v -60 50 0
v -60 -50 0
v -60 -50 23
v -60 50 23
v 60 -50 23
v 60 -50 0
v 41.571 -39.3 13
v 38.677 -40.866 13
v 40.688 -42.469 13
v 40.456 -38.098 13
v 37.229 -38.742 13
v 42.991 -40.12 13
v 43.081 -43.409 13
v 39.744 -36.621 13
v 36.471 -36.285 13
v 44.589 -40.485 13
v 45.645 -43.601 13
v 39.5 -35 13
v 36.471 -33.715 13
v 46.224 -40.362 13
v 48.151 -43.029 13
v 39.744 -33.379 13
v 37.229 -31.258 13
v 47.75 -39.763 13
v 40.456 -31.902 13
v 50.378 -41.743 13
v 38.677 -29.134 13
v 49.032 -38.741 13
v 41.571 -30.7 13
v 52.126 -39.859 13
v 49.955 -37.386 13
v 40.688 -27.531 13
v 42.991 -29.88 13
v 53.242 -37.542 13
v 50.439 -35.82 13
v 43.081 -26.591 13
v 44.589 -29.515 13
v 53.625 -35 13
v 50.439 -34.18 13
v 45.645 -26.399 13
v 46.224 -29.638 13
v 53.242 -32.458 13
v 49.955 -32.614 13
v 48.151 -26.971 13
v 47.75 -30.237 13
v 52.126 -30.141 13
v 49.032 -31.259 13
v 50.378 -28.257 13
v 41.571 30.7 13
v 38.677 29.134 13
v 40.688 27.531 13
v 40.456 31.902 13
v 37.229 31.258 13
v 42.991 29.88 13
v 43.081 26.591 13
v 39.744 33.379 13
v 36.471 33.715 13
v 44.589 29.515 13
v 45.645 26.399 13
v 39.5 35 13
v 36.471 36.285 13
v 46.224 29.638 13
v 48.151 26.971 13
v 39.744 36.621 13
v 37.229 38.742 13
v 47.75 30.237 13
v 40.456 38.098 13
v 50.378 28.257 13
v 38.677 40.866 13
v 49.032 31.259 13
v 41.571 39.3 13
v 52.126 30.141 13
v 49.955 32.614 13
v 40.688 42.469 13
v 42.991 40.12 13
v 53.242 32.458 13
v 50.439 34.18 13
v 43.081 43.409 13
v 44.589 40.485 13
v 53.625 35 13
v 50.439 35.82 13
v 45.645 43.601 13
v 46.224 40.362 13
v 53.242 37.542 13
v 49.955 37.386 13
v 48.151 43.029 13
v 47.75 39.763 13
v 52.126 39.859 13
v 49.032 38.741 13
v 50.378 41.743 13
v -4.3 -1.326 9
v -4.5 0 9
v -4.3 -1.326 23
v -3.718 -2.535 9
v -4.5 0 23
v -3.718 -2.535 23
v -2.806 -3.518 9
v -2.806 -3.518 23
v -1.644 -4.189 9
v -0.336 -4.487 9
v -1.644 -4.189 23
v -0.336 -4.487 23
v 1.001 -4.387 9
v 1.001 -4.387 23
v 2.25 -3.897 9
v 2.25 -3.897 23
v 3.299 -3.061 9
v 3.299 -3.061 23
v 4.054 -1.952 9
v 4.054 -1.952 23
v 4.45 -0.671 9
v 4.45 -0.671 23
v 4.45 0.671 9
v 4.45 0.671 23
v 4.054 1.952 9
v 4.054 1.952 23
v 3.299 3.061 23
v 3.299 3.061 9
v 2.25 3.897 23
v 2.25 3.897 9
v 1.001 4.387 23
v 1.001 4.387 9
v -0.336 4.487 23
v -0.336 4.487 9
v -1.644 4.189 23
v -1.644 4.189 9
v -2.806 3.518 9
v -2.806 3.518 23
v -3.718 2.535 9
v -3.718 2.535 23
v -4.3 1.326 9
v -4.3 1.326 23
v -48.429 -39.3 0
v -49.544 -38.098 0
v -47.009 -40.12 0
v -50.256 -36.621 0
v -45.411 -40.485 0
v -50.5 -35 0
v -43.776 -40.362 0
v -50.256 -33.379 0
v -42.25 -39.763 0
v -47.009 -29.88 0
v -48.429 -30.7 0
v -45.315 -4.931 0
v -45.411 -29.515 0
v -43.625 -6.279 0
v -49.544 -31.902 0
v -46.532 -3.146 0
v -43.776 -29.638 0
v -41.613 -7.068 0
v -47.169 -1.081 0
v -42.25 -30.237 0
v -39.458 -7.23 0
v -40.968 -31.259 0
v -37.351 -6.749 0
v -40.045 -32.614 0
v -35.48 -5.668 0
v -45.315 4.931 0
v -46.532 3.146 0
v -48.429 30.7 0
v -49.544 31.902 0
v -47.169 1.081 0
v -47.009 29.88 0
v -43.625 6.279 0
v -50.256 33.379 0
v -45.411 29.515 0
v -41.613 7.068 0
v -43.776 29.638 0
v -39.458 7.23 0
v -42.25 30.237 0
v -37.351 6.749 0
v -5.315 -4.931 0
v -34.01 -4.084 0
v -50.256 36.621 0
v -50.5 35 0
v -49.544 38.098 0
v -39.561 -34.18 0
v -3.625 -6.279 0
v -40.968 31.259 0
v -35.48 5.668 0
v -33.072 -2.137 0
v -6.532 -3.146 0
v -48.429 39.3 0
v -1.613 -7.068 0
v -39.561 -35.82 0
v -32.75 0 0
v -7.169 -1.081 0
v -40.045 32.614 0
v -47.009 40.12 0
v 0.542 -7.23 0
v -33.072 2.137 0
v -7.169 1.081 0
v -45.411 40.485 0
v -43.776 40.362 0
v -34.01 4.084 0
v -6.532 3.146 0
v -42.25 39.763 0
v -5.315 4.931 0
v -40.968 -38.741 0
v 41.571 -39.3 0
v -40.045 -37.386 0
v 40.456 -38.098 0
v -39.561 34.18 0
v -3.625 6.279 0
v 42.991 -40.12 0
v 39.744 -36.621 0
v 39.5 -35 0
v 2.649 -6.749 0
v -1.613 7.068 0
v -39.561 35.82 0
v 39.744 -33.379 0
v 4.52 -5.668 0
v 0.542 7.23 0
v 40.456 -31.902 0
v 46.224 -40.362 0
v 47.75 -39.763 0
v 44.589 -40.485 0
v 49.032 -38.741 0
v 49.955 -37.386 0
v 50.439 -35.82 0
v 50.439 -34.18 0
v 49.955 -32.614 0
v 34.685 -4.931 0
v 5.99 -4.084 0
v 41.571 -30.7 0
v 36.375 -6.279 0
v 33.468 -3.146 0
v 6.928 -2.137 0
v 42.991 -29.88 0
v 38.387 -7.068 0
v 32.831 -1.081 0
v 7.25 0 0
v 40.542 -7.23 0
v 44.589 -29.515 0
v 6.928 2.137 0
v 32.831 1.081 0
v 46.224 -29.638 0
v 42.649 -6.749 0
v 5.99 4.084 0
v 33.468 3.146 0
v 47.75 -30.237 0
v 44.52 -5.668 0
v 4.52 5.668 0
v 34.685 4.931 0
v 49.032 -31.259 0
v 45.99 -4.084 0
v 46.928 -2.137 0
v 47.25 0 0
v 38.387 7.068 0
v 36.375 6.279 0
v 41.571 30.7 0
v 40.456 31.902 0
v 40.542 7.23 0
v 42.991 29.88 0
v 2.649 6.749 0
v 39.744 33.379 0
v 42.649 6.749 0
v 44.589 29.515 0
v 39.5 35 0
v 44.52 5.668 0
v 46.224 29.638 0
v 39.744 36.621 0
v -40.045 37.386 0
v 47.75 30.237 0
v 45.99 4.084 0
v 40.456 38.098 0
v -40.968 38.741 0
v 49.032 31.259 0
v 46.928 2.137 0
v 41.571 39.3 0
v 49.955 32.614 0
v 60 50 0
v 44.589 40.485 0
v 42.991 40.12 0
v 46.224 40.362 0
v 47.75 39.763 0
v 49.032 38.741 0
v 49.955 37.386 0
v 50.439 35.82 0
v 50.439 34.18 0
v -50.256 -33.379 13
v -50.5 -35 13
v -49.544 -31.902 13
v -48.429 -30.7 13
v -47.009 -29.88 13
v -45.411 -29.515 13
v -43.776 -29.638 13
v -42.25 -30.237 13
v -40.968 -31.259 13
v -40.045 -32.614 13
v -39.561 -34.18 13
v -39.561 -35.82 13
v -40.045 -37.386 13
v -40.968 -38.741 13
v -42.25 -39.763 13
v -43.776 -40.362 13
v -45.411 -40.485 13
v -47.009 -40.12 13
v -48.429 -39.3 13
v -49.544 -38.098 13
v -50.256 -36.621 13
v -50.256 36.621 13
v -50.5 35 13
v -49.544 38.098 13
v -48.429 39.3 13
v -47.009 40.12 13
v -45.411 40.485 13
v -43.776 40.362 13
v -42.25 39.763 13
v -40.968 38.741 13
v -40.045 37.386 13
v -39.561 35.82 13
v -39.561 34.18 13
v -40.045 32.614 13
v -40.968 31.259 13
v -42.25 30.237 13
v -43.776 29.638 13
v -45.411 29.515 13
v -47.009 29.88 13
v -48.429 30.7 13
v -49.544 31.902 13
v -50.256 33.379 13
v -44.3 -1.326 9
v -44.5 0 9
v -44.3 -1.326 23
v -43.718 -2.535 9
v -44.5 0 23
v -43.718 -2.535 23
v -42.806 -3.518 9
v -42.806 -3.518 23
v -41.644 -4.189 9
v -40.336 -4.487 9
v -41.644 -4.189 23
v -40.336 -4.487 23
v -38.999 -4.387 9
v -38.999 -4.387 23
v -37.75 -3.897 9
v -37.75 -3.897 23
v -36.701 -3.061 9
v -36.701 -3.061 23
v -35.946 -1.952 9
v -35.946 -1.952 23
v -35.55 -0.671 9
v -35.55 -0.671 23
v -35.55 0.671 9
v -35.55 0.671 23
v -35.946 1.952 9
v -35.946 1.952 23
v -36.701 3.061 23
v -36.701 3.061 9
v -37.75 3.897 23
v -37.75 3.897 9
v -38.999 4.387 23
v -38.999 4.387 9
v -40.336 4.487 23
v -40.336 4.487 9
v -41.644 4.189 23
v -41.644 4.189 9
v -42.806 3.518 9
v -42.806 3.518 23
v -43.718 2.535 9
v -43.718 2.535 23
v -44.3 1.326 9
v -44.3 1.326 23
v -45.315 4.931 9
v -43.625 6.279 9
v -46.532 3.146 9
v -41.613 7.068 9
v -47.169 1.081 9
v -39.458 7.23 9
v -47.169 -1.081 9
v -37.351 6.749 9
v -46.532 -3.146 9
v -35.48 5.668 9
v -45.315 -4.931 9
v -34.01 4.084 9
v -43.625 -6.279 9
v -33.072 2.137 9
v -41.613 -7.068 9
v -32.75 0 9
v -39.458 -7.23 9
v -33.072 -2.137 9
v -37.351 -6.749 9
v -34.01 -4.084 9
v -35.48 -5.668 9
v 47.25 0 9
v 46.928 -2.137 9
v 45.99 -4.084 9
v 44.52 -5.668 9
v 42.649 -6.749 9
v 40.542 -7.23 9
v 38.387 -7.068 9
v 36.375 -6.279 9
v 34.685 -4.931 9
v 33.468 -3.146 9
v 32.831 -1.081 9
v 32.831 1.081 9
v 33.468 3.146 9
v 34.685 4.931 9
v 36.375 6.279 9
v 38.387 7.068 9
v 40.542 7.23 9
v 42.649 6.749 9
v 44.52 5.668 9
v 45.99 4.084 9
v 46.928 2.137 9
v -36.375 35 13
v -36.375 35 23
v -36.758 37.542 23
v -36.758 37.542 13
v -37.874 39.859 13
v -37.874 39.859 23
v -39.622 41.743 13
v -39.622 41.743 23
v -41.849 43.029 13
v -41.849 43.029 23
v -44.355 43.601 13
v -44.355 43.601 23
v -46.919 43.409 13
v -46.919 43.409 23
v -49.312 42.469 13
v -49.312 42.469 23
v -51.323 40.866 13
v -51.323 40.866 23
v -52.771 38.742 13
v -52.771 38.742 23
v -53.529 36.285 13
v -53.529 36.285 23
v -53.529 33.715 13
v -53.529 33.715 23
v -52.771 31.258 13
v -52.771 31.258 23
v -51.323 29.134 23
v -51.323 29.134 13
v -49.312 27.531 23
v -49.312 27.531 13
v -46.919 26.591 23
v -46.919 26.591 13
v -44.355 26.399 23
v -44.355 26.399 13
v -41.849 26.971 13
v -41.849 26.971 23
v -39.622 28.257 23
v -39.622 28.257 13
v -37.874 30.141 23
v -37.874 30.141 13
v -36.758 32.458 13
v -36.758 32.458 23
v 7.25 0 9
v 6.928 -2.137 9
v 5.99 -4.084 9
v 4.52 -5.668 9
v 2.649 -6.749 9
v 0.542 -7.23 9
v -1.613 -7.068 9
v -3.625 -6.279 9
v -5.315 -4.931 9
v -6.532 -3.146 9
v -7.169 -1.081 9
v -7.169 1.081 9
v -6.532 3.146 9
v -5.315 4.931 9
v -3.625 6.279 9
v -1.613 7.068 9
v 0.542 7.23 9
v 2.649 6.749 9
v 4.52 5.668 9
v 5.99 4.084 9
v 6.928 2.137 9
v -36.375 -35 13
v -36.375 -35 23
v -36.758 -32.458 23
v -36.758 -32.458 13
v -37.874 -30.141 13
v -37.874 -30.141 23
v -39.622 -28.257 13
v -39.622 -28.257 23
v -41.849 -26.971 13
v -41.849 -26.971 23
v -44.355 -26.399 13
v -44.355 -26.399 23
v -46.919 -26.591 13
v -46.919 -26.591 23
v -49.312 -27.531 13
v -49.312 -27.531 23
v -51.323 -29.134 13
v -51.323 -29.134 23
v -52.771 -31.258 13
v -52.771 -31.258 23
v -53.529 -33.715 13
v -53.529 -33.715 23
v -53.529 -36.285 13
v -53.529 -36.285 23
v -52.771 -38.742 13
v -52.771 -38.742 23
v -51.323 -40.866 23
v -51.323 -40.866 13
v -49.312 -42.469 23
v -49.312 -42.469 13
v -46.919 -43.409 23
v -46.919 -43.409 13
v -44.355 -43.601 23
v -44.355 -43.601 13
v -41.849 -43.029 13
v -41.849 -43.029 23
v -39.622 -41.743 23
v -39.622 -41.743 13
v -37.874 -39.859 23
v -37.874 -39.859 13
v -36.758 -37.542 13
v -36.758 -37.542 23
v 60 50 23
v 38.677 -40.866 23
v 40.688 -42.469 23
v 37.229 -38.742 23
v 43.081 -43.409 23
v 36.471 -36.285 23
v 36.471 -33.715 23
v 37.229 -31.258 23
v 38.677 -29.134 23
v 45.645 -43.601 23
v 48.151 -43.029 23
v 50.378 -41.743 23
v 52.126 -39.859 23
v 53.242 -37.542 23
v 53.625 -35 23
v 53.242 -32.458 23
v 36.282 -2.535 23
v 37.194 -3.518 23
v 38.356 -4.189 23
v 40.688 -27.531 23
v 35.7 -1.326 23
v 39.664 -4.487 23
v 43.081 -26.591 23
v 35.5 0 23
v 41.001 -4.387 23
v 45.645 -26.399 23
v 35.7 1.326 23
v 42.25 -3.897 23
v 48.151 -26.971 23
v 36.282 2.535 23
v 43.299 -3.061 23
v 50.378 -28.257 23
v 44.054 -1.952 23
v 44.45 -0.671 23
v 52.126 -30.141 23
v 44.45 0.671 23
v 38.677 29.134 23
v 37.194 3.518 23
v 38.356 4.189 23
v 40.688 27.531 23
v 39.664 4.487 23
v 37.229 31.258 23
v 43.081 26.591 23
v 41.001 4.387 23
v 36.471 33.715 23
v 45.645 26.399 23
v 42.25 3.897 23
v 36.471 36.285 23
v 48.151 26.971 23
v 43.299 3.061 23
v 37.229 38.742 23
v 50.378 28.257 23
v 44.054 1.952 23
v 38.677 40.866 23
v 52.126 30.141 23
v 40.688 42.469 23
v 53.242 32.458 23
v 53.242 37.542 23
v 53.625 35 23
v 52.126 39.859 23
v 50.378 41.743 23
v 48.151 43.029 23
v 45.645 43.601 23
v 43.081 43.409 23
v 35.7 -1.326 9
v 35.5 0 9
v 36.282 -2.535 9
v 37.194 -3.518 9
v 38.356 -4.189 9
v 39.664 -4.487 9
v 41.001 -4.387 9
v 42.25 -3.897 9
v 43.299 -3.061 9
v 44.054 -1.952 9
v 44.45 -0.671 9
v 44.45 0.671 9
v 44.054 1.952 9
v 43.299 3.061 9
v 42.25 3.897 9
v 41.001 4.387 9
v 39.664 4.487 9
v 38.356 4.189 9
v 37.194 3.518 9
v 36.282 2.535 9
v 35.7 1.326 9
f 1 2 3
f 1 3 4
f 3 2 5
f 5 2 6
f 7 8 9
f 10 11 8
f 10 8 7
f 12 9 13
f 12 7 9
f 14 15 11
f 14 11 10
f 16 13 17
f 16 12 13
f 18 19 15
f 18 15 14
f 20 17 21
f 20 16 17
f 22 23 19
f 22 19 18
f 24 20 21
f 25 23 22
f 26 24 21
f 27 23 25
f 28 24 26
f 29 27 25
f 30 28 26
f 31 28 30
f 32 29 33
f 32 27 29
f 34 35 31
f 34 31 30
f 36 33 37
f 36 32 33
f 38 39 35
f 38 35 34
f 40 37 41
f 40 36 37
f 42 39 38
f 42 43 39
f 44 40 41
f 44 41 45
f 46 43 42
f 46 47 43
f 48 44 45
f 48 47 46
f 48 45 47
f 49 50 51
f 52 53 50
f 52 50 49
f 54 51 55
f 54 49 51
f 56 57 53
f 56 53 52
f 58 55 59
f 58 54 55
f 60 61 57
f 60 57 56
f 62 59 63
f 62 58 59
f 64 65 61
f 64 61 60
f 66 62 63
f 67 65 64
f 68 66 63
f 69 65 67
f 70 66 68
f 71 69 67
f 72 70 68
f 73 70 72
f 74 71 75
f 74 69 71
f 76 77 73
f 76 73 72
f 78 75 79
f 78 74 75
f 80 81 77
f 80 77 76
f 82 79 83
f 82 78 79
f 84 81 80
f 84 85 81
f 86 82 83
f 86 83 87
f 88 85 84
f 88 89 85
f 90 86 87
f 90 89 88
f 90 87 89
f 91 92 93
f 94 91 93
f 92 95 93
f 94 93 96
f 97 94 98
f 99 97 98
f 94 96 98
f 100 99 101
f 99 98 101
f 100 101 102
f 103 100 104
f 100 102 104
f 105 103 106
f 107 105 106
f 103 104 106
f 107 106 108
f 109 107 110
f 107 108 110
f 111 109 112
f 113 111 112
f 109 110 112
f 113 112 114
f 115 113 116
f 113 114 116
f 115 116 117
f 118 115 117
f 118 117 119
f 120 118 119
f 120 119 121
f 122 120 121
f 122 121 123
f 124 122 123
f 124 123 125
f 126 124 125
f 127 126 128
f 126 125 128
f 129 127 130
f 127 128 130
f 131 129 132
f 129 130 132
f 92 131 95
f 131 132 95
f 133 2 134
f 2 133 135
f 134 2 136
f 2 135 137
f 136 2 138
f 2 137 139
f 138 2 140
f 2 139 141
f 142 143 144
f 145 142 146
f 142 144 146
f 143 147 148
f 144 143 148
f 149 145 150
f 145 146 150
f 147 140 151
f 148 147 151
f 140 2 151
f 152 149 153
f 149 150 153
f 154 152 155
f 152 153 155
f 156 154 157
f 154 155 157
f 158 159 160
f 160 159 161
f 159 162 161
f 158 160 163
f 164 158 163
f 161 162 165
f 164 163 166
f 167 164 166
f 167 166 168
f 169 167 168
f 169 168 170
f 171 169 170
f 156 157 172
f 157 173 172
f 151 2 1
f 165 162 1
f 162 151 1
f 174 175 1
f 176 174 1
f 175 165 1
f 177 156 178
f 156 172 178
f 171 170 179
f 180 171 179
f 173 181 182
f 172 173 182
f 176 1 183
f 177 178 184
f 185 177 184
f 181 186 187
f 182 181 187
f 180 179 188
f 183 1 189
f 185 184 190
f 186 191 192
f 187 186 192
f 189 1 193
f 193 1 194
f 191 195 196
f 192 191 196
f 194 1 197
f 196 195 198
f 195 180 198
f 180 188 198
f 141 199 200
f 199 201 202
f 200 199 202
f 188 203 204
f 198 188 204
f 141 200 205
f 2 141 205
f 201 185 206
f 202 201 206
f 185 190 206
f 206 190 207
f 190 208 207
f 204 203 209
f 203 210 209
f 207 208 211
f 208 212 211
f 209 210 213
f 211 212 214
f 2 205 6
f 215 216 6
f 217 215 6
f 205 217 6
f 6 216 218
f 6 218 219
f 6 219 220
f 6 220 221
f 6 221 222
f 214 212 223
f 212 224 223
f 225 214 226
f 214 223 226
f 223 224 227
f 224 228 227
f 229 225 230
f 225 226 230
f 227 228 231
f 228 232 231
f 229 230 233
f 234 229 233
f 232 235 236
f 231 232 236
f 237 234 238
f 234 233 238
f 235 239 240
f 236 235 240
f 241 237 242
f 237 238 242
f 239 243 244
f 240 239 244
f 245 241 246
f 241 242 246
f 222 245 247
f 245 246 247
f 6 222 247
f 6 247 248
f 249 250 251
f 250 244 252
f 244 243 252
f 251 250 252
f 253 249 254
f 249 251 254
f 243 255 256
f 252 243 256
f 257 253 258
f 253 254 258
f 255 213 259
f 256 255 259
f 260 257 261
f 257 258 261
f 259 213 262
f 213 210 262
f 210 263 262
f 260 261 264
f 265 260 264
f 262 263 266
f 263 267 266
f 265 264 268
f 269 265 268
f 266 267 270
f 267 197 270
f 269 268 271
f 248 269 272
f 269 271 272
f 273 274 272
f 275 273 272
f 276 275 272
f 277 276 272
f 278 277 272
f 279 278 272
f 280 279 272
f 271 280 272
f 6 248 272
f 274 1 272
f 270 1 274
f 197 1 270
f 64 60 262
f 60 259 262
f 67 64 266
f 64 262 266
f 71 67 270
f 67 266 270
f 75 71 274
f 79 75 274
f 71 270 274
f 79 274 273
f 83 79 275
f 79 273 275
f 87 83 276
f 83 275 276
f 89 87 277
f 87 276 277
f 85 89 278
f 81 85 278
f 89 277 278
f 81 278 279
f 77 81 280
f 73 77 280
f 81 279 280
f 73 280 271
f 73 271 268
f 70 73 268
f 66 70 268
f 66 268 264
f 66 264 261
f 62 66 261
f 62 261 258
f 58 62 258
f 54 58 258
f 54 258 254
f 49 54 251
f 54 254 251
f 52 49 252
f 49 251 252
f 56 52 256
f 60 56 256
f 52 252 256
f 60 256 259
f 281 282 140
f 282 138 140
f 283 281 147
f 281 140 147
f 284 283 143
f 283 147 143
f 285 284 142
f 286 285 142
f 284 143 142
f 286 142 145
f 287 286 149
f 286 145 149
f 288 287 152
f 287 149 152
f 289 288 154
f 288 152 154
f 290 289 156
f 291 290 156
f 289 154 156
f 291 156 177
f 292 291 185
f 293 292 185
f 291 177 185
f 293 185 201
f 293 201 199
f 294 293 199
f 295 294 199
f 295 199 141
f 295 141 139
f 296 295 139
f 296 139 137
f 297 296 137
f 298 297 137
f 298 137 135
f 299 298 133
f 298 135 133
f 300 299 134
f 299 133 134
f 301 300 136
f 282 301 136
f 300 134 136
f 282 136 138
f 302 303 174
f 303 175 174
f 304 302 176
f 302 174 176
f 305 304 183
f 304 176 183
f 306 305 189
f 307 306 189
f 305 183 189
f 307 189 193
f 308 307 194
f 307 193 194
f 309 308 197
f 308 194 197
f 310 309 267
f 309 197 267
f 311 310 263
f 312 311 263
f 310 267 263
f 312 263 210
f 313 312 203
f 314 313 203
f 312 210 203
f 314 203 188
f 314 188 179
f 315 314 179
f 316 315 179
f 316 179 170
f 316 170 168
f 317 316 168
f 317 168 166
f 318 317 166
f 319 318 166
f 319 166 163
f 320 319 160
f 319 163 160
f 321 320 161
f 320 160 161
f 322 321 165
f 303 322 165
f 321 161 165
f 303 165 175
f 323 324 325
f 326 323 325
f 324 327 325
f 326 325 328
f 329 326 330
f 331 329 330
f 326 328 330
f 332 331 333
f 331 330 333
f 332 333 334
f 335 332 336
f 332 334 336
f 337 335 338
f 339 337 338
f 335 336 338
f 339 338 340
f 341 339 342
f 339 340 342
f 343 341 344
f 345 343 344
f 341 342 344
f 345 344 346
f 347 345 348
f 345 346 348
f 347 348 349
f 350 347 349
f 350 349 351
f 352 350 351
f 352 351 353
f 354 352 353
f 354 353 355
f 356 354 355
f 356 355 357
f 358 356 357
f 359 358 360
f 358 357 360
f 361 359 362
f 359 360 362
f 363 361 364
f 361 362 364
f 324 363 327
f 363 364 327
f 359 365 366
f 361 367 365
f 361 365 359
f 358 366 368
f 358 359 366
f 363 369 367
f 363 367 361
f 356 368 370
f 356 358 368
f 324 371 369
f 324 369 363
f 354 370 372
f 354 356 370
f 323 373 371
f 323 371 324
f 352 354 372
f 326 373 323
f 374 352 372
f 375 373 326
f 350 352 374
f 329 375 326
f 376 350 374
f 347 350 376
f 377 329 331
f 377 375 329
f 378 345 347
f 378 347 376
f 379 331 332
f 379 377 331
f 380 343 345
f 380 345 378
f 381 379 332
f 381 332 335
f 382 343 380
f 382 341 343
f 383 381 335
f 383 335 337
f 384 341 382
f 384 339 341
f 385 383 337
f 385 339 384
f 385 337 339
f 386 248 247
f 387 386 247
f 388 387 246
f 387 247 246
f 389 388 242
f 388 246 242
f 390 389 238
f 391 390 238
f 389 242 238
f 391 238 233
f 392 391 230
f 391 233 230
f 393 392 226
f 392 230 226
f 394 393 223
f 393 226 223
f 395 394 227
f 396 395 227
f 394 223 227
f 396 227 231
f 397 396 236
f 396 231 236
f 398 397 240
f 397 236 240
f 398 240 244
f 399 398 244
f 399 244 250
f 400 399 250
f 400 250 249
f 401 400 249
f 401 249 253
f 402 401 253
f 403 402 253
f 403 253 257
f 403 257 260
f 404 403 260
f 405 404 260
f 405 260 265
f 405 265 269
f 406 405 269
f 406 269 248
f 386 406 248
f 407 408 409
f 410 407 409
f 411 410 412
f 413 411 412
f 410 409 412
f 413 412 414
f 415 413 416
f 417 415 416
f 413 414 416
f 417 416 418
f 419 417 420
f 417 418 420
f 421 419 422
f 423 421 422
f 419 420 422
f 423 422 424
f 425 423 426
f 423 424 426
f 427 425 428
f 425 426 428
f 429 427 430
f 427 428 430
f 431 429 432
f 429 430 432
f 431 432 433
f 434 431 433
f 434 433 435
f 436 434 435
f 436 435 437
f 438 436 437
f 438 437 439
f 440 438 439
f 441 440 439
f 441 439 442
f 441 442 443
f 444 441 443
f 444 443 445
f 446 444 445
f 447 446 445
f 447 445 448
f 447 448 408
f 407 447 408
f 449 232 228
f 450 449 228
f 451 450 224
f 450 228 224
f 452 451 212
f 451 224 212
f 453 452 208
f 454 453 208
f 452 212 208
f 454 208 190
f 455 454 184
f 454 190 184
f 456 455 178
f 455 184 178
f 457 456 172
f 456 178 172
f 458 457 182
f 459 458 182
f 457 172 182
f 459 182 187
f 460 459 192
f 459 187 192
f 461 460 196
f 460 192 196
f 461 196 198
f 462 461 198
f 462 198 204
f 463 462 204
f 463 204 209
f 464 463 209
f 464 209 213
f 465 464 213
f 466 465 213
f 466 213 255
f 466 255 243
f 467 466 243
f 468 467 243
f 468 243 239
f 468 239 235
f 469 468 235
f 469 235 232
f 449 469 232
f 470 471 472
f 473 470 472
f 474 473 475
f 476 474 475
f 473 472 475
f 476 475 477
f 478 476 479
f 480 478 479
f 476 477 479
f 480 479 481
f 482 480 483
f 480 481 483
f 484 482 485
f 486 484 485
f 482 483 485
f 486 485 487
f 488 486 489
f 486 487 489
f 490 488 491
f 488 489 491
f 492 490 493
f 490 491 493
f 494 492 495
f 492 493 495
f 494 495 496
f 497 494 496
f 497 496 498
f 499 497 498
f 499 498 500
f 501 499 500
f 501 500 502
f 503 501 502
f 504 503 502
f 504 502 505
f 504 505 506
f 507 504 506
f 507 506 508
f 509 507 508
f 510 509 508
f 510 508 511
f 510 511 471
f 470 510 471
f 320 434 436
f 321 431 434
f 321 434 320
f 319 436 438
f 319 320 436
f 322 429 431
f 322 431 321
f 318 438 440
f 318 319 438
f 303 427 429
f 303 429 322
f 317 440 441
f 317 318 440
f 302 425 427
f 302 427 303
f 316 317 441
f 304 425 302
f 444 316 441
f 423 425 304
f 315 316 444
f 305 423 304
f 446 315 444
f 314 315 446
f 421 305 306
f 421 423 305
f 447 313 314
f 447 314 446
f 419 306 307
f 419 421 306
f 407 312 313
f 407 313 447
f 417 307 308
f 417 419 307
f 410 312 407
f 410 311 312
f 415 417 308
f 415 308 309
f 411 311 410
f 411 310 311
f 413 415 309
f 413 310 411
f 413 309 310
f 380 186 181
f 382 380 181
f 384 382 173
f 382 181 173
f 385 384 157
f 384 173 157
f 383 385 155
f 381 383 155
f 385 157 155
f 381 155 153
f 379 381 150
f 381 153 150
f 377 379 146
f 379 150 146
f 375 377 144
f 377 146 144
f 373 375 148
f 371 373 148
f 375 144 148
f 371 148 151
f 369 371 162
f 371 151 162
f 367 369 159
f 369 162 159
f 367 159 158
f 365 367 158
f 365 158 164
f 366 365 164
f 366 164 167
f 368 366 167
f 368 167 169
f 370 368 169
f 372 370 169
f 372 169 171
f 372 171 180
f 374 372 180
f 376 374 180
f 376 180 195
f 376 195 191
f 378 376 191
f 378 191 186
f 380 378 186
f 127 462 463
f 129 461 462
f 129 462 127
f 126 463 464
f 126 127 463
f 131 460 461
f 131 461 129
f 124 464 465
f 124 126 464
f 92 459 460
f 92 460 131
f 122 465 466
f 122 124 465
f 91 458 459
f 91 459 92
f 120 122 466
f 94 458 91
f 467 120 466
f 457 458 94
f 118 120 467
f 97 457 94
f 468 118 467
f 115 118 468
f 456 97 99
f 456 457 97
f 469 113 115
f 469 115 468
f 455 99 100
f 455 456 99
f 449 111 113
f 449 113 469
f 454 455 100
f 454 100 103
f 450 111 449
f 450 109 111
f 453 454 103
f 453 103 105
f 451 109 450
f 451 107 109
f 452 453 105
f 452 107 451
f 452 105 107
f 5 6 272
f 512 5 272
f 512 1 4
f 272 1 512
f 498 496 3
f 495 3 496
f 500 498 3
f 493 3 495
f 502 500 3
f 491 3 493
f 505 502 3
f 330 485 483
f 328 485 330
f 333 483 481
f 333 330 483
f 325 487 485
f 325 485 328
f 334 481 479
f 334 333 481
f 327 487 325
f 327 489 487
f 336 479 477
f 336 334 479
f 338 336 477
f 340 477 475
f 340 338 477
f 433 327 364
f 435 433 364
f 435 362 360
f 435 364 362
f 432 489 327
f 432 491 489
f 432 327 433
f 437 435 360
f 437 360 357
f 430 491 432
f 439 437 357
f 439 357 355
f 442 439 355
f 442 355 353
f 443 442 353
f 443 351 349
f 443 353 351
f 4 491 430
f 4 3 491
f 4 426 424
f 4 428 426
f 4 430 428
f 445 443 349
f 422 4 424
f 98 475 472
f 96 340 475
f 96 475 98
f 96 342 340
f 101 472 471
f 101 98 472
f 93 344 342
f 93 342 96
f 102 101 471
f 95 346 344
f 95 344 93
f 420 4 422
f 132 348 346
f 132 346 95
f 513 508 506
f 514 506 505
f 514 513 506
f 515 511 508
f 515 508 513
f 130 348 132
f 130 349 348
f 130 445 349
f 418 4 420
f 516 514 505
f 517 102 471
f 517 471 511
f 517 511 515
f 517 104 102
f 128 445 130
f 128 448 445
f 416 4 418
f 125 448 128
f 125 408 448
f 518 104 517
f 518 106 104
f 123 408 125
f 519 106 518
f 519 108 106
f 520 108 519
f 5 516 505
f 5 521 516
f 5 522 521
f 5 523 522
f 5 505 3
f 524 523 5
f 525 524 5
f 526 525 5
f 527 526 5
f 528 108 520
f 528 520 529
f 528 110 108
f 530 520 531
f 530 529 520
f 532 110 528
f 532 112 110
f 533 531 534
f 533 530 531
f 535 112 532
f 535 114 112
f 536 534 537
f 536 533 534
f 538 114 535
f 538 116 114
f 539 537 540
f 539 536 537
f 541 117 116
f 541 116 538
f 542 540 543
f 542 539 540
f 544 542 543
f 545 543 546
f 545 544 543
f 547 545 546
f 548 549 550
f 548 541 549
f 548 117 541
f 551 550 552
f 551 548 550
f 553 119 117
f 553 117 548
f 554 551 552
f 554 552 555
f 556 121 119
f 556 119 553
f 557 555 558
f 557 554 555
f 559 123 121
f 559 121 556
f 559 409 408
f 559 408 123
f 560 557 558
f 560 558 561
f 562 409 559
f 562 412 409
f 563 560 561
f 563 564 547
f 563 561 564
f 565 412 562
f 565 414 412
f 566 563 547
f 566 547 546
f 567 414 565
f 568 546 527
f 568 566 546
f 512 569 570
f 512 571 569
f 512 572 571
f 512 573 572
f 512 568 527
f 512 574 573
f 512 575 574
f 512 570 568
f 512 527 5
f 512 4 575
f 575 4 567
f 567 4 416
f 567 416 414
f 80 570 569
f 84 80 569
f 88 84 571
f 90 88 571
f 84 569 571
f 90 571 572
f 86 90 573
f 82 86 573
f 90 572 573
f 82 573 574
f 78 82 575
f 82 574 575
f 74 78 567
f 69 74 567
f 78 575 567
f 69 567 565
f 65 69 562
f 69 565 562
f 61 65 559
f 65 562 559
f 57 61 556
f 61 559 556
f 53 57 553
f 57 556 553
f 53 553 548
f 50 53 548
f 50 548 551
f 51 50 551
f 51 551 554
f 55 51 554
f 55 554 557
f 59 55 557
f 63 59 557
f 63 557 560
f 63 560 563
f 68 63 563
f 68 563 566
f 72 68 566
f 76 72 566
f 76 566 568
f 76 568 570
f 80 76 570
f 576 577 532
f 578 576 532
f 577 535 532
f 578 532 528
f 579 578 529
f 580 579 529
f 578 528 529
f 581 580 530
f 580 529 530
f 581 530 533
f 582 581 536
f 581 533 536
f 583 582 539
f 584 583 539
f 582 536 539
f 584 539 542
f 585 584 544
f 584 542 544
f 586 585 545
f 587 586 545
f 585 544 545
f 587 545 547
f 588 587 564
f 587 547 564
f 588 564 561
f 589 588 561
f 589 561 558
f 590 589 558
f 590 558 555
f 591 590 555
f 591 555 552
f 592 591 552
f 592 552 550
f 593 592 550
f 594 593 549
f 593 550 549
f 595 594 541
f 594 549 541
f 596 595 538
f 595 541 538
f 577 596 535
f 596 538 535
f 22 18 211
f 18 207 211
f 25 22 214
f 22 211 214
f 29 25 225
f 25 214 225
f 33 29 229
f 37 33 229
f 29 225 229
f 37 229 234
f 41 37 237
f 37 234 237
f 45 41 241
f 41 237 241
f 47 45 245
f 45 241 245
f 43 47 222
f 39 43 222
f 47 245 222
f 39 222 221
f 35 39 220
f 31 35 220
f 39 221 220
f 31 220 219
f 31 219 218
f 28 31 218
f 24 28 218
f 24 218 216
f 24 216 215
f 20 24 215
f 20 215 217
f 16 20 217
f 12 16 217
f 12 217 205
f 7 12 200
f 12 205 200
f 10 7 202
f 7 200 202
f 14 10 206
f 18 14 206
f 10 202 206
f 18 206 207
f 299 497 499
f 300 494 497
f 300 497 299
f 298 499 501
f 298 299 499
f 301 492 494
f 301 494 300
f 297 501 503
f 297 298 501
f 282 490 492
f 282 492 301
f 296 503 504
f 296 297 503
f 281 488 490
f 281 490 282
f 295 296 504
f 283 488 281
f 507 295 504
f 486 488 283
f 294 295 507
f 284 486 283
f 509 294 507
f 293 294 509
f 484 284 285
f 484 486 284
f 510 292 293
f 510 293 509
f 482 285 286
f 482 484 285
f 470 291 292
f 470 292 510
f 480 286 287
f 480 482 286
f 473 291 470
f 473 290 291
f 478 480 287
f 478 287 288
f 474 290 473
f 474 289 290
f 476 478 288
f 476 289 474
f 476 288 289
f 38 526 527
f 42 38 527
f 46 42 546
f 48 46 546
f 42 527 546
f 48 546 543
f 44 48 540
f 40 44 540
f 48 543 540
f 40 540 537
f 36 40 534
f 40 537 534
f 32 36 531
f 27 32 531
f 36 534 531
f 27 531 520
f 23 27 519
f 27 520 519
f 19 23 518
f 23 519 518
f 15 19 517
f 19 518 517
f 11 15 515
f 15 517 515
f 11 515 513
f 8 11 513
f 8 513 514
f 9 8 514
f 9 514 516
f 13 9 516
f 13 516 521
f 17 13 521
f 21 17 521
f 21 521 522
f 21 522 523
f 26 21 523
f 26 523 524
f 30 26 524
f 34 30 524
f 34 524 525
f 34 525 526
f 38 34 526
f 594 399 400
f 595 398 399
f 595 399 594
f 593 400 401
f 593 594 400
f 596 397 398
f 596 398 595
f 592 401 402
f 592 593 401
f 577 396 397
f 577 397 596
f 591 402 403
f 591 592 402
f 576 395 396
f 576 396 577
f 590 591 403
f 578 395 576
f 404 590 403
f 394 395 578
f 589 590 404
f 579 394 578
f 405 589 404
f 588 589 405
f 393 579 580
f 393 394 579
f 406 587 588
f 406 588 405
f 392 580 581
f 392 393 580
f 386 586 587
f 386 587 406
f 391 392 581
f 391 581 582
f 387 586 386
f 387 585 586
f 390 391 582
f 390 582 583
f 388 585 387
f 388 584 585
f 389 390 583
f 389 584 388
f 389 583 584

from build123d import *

# Parameters (mm, degrees)
F0_W           = 120
F0_H           = 100
F1_DEPTH       = 23
F3_D           = 9
F3_CBORE_D     = 14.5
F3_CBORE_DEPTH = 9
F5_D           = 11
F5_CBORE_D     = 17.25
F5_CBORE_DEPTH = 10


with BuildPart() as f1:
    # F0 (on Top) → F1 (new body)
    with BuildSketch(Plane.XY):
        Rectangle(F0_W, F0_H)
    extrude(amount=F1_DEPTH)

    # F3 (through all)
    with Locations(Plane(origin=(0, 0, 0), x_dir=(1, 0, 0), z_dir=(0, 0, -1))):
        with Locations((-40, 0), (0, 0), (40, 0)):
            CounterBoreHole(F3_D / 2, F3_CBORE_D / 2, F3_CBORE_DEPTH)

    # F5 (through all)
    with Locations(Plane.XY.offset(23)):
        with Locations((-45, 35), (45, 35), (45, -35), (-45, -35)):
            CounterBoreHole(F5_D / 2, F5_CBORE_D / 2, F5_CBORE_DEPTH)


solid = f1.part
